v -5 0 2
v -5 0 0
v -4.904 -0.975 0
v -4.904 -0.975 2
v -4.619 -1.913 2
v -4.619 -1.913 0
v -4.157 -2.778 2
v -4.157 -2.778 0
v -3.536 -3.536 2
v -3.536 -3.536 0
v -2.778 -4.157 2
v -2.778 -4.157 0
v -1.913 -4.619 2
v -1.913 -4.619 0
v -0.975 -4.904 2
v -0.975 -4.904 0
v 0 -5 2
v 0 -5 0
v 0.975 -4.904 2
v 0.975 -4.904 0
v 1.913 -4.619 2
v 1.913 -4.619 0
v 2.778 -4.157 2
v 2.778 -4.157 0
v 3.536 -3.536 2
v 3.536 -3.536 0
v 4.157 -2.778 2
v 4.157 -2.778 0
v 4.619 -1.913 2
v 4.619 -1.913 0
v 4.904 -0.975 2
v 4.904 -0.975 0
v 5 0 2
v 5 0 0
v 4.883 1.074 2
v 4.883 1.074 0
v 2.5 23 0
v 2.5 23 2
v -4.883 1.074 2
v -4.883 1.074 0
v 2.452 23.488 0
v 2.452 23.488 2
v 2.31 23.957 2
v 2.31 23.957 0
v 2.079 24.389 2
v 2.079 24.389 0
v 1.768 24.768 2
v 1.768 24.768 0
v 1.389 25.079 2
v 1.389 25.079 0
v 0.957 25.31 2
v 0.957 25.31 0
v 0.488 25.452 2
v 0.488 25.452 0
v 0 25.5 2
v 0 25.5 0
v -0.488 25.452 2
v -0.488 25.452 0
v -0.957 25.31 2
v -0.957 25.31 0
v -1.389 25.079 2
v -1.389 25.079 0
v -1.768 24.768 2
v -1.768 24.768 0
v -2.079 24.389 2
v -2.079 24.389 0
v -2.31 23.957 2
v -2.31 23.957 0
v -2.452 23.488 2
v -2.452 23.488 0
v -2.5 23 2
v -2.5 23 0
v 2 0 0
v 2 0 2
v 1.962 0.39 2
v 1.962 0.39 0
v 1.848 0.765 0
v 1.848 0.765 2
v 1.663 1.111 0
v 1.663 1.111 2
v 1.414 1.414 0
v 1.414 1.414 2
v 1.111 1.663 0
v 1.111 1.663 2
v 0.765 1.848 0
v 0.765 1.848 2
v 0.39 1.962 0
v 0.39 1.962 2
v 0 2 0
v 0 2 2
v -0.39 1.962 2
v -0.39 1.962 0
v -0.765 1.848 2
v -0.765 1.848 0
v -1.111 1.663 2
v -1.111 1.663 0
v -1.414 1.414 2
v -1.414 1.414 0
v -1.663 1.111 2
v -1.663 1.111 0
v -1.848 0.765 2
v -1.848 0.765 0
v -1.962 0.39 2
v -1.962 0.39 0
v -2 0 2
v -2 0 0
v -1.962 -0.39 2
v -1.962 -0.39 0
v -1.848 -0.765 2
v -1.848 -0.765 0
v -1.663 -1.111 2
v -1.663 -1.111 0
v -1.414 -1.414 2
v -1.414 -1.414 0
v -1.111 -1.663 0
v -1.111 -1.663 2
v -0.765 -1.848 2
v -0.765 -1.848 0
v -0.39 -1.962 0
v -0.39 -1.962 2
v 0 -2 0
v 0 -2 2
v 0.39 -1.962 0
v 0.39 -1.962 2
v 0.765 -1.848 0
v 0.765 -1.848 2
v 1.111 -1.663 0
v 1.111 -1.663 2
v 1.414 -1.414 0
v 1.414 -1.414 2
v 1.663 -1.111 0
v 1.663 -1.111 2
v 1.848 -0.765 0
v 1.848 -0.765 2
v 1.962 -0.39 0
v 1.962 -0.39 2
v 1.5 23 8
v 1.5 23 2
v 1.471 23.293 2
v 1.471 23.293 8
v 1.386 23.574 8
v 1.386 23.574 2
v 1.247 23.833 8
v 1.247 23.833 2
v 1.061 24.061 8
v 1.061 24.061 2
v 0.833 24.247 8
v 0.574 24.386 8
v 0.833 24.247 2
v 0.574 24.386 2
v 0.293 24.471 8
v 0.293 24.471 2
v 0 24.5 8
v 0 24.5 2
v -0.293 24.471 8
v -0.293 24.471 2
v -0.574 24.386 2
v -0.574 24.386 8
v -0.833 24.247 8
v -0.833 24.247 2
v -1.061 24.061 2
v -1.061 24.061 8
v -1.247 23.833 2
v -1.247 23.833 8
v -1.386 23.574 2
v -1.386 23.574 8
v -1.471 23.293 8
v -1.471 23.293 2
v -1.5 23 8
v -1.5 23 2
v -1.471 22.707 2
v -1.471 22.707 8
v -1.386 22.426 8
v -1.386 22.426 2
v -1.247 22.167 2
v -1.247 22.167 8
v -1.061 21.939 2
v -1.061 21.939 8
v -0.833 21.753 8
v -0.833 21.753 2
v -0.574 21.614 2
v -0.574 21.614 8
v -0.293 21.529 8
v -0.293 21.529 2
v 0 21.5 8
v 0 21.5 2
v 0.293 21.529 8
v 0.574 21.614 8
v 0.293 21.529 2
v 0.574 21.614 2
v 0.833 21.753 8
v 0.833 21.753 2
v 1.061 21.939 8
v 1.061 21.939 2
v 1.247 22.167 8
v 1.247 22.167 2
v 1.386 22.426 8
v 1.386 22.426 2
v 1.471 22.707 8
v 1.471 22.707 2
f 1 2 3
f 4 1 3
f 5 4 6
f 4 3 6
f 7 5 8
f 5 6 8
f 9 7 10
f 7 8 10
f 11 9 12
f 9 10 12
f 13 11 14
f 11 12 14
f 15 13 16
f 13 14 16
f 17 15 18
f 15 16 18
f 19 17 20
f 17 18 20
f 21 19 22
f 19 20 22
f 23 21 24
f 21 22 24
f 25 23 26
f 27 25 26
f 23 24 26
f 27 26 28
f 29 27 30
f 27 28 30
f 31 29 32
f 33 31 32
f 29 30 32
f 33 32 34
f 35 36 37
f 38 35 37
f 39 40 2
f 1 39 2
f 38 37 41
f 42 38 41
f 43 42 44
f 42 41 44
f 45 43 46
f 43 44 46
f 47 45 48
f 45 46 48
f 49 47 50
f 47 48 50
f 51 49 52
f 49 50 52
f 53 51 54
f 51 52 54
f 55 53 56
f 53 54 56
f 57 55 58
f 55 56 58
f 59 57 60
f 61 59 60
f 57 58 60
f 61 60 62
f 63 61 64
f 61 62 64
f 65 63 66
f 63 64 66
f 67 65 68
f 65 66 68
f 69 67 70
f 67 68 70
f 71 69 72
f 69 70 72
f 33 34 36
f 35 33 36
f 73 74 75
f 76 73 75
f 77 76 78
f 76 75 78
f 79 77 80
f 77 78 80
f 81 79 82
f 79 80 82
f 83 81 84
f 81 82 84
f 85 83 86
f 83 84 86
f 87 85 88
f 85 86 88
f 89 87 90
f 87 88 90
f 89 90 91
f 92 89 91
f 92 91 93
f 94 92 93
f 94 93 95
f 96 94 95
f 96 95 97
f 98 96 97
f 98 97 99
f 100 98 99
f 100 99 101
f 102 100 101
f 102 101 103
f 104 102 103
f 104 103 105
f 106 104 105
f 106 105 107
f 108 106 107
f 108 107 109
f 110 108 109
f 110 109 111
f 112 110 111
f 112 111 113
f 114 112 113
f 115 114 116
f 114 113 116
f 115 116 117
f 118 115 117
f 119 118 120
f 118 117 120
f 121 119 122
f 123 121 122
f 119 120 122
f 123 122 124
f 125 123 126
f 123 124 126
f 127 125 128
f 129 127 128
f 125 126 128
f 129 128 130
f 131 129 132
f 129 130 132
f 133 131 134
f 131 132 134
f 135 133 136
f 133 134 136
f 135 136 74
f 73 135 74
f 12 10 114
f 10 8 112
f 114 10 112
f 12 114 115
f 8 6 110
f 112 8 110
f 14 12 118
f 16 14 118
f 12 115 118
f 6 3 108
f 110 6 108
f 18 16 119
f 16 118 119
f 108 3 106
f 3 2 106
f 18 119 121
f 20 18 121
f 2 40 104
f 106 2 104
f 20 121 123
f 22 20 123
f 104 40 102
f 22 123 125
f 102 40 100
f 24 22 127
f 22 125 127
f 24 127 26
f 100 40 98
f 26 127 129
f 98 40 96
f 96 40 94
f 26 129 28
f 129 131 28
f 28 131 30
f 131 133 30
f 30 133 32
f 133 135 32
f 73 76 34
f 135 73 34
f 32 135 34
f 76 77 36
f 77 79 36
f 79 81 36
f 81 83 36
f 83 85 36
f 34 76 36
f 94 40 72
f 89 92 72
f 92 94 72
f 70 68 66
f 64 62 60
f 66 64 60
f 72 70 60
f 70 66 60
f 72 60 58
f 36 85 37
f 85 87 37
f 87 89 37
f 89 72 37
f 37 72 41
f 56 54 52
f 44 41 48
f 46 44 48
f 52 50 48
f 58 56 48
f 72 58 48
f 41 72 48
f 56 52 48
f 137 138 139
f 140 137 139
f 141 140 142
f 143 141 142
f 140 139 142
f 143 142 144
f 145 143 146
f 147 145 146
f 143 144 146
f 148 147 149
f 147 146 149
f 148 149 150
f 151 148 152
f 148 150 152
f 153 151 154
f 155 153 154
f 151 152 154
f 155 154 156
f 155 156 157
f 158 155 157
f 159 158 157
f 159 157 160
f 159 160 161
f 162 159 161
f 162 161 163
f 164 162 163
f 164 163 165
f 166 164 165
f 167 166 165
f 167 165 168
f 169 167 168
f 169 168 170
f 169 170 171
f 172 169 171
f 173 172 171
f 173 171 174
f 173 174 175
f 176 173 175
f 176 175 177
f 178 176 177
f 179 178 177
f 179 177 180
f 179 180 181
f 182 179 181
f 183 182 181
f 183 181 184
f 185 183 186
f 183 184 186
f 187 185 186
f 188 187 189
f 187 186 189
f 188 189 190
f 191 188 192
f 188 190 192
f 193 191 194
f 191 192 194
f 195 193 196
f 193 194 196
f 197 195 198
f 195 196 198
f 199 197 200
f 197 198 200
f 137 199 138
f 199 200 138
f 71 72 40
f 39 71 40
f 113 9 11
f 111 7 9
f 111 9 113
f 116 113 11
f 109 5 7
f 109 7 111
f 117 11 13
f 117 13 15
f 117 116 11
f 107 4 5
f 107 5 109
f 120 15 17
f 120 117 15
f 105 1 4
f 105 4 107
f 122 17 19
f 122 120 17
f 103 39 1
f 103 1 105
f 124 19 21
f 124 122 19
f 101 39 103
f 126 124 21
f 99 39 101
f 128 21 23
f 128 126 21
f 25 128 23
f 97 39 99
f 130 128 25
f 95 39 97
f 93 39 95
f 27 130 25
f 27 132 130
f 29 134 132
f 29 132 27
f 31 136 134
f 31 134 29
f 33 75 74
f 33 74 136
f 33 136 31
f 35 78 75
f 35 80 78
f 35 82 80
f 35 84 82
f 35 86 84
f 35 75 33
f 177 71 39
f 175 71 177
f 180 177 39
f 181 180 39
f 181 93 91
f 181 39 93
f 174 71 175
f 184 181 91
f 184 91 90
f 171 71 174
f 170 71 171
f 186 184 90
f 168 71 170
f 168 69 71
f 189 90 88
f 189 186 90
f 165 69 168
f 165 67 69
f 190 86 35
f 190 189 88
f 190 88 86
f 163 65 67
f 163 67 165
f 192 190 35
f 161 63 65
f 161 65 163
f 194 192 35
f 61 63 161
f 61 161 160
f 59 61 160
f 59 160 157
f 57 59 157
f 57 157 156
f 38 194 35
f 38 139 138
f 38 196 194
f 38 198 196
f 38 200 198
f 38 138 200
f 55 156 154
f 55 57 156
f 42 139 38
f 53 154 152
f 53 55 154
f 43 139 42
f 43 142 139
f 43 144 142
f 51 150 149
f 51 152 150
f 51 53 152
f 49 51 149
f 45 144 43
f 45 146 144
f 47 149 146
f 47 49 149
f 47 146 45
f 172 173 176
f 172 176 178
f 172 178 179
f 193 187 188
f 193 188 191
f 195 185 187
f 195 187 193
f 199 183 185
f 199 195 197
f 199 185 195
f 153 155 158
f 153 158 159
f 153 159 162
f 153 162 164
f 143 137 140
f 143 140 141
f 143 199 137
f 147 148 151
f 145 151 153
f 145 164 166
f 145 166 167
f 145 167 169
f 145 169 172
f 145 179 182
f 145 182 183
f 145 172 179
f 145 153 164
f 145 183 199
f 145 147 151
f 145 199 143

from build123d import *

# Parameters (mm, degrees)
SKETCH1_R           = 1.5
BOSS_EXTRUDE1_DEPTH = 2
SKETCH1_3_R         = 1.5
BOSS_EXTRUDE2_DEPTH = 8
SKETCH2_R           = 2
CUT_EXTRUDE1_DEPTH  = 10


with BuildPart() as part:
    # Sketch1 → Boss-Extrude1 (new body)
    with BuildSketch(Plane.XY):
        with BuildLine():
            Line((-4.883232135, 1.074264362), (-5, 0))
            ThreePointArc((-5, 0), (0, -5), (5, 0))
            Line((5, 0), (4.883232135, 1.074264362))
            Line((4.883232135, 1.074264362), (2.5, 23))
            ThreePointArc((2.5, 23), (0, 25.5), (-2.5, 23))
            Line((-2.5, 23), (-4.883232135, 1.074264362))
        make_face()
        with Locations((0, 23)):
            Circle(SKETCH1_R, mode=Mode.SUBTRACT)
    extrude(amount=BOSS_EXTRUDE1_DEPTH)

    # Sketch1<3> → Boss-Extrude2 (add)
    with BuildSketch(Plane.XY):
        with Locations((0, 23)):
            Circle(SKETCH1_3_R)
    extrude(amount=BOSS_EXTRUDE2_DEPTH)

    # Sketch2 → Cut-Extrude1 (cut)
    with BuildSketch(Plane.XY.offset(2)):
        Circle(SKETCH2_R)
    extrude(amount=-CUT_EXTRUDE1_DEPTH, mode=Mode.SUBTRACT)


solid = part.part
